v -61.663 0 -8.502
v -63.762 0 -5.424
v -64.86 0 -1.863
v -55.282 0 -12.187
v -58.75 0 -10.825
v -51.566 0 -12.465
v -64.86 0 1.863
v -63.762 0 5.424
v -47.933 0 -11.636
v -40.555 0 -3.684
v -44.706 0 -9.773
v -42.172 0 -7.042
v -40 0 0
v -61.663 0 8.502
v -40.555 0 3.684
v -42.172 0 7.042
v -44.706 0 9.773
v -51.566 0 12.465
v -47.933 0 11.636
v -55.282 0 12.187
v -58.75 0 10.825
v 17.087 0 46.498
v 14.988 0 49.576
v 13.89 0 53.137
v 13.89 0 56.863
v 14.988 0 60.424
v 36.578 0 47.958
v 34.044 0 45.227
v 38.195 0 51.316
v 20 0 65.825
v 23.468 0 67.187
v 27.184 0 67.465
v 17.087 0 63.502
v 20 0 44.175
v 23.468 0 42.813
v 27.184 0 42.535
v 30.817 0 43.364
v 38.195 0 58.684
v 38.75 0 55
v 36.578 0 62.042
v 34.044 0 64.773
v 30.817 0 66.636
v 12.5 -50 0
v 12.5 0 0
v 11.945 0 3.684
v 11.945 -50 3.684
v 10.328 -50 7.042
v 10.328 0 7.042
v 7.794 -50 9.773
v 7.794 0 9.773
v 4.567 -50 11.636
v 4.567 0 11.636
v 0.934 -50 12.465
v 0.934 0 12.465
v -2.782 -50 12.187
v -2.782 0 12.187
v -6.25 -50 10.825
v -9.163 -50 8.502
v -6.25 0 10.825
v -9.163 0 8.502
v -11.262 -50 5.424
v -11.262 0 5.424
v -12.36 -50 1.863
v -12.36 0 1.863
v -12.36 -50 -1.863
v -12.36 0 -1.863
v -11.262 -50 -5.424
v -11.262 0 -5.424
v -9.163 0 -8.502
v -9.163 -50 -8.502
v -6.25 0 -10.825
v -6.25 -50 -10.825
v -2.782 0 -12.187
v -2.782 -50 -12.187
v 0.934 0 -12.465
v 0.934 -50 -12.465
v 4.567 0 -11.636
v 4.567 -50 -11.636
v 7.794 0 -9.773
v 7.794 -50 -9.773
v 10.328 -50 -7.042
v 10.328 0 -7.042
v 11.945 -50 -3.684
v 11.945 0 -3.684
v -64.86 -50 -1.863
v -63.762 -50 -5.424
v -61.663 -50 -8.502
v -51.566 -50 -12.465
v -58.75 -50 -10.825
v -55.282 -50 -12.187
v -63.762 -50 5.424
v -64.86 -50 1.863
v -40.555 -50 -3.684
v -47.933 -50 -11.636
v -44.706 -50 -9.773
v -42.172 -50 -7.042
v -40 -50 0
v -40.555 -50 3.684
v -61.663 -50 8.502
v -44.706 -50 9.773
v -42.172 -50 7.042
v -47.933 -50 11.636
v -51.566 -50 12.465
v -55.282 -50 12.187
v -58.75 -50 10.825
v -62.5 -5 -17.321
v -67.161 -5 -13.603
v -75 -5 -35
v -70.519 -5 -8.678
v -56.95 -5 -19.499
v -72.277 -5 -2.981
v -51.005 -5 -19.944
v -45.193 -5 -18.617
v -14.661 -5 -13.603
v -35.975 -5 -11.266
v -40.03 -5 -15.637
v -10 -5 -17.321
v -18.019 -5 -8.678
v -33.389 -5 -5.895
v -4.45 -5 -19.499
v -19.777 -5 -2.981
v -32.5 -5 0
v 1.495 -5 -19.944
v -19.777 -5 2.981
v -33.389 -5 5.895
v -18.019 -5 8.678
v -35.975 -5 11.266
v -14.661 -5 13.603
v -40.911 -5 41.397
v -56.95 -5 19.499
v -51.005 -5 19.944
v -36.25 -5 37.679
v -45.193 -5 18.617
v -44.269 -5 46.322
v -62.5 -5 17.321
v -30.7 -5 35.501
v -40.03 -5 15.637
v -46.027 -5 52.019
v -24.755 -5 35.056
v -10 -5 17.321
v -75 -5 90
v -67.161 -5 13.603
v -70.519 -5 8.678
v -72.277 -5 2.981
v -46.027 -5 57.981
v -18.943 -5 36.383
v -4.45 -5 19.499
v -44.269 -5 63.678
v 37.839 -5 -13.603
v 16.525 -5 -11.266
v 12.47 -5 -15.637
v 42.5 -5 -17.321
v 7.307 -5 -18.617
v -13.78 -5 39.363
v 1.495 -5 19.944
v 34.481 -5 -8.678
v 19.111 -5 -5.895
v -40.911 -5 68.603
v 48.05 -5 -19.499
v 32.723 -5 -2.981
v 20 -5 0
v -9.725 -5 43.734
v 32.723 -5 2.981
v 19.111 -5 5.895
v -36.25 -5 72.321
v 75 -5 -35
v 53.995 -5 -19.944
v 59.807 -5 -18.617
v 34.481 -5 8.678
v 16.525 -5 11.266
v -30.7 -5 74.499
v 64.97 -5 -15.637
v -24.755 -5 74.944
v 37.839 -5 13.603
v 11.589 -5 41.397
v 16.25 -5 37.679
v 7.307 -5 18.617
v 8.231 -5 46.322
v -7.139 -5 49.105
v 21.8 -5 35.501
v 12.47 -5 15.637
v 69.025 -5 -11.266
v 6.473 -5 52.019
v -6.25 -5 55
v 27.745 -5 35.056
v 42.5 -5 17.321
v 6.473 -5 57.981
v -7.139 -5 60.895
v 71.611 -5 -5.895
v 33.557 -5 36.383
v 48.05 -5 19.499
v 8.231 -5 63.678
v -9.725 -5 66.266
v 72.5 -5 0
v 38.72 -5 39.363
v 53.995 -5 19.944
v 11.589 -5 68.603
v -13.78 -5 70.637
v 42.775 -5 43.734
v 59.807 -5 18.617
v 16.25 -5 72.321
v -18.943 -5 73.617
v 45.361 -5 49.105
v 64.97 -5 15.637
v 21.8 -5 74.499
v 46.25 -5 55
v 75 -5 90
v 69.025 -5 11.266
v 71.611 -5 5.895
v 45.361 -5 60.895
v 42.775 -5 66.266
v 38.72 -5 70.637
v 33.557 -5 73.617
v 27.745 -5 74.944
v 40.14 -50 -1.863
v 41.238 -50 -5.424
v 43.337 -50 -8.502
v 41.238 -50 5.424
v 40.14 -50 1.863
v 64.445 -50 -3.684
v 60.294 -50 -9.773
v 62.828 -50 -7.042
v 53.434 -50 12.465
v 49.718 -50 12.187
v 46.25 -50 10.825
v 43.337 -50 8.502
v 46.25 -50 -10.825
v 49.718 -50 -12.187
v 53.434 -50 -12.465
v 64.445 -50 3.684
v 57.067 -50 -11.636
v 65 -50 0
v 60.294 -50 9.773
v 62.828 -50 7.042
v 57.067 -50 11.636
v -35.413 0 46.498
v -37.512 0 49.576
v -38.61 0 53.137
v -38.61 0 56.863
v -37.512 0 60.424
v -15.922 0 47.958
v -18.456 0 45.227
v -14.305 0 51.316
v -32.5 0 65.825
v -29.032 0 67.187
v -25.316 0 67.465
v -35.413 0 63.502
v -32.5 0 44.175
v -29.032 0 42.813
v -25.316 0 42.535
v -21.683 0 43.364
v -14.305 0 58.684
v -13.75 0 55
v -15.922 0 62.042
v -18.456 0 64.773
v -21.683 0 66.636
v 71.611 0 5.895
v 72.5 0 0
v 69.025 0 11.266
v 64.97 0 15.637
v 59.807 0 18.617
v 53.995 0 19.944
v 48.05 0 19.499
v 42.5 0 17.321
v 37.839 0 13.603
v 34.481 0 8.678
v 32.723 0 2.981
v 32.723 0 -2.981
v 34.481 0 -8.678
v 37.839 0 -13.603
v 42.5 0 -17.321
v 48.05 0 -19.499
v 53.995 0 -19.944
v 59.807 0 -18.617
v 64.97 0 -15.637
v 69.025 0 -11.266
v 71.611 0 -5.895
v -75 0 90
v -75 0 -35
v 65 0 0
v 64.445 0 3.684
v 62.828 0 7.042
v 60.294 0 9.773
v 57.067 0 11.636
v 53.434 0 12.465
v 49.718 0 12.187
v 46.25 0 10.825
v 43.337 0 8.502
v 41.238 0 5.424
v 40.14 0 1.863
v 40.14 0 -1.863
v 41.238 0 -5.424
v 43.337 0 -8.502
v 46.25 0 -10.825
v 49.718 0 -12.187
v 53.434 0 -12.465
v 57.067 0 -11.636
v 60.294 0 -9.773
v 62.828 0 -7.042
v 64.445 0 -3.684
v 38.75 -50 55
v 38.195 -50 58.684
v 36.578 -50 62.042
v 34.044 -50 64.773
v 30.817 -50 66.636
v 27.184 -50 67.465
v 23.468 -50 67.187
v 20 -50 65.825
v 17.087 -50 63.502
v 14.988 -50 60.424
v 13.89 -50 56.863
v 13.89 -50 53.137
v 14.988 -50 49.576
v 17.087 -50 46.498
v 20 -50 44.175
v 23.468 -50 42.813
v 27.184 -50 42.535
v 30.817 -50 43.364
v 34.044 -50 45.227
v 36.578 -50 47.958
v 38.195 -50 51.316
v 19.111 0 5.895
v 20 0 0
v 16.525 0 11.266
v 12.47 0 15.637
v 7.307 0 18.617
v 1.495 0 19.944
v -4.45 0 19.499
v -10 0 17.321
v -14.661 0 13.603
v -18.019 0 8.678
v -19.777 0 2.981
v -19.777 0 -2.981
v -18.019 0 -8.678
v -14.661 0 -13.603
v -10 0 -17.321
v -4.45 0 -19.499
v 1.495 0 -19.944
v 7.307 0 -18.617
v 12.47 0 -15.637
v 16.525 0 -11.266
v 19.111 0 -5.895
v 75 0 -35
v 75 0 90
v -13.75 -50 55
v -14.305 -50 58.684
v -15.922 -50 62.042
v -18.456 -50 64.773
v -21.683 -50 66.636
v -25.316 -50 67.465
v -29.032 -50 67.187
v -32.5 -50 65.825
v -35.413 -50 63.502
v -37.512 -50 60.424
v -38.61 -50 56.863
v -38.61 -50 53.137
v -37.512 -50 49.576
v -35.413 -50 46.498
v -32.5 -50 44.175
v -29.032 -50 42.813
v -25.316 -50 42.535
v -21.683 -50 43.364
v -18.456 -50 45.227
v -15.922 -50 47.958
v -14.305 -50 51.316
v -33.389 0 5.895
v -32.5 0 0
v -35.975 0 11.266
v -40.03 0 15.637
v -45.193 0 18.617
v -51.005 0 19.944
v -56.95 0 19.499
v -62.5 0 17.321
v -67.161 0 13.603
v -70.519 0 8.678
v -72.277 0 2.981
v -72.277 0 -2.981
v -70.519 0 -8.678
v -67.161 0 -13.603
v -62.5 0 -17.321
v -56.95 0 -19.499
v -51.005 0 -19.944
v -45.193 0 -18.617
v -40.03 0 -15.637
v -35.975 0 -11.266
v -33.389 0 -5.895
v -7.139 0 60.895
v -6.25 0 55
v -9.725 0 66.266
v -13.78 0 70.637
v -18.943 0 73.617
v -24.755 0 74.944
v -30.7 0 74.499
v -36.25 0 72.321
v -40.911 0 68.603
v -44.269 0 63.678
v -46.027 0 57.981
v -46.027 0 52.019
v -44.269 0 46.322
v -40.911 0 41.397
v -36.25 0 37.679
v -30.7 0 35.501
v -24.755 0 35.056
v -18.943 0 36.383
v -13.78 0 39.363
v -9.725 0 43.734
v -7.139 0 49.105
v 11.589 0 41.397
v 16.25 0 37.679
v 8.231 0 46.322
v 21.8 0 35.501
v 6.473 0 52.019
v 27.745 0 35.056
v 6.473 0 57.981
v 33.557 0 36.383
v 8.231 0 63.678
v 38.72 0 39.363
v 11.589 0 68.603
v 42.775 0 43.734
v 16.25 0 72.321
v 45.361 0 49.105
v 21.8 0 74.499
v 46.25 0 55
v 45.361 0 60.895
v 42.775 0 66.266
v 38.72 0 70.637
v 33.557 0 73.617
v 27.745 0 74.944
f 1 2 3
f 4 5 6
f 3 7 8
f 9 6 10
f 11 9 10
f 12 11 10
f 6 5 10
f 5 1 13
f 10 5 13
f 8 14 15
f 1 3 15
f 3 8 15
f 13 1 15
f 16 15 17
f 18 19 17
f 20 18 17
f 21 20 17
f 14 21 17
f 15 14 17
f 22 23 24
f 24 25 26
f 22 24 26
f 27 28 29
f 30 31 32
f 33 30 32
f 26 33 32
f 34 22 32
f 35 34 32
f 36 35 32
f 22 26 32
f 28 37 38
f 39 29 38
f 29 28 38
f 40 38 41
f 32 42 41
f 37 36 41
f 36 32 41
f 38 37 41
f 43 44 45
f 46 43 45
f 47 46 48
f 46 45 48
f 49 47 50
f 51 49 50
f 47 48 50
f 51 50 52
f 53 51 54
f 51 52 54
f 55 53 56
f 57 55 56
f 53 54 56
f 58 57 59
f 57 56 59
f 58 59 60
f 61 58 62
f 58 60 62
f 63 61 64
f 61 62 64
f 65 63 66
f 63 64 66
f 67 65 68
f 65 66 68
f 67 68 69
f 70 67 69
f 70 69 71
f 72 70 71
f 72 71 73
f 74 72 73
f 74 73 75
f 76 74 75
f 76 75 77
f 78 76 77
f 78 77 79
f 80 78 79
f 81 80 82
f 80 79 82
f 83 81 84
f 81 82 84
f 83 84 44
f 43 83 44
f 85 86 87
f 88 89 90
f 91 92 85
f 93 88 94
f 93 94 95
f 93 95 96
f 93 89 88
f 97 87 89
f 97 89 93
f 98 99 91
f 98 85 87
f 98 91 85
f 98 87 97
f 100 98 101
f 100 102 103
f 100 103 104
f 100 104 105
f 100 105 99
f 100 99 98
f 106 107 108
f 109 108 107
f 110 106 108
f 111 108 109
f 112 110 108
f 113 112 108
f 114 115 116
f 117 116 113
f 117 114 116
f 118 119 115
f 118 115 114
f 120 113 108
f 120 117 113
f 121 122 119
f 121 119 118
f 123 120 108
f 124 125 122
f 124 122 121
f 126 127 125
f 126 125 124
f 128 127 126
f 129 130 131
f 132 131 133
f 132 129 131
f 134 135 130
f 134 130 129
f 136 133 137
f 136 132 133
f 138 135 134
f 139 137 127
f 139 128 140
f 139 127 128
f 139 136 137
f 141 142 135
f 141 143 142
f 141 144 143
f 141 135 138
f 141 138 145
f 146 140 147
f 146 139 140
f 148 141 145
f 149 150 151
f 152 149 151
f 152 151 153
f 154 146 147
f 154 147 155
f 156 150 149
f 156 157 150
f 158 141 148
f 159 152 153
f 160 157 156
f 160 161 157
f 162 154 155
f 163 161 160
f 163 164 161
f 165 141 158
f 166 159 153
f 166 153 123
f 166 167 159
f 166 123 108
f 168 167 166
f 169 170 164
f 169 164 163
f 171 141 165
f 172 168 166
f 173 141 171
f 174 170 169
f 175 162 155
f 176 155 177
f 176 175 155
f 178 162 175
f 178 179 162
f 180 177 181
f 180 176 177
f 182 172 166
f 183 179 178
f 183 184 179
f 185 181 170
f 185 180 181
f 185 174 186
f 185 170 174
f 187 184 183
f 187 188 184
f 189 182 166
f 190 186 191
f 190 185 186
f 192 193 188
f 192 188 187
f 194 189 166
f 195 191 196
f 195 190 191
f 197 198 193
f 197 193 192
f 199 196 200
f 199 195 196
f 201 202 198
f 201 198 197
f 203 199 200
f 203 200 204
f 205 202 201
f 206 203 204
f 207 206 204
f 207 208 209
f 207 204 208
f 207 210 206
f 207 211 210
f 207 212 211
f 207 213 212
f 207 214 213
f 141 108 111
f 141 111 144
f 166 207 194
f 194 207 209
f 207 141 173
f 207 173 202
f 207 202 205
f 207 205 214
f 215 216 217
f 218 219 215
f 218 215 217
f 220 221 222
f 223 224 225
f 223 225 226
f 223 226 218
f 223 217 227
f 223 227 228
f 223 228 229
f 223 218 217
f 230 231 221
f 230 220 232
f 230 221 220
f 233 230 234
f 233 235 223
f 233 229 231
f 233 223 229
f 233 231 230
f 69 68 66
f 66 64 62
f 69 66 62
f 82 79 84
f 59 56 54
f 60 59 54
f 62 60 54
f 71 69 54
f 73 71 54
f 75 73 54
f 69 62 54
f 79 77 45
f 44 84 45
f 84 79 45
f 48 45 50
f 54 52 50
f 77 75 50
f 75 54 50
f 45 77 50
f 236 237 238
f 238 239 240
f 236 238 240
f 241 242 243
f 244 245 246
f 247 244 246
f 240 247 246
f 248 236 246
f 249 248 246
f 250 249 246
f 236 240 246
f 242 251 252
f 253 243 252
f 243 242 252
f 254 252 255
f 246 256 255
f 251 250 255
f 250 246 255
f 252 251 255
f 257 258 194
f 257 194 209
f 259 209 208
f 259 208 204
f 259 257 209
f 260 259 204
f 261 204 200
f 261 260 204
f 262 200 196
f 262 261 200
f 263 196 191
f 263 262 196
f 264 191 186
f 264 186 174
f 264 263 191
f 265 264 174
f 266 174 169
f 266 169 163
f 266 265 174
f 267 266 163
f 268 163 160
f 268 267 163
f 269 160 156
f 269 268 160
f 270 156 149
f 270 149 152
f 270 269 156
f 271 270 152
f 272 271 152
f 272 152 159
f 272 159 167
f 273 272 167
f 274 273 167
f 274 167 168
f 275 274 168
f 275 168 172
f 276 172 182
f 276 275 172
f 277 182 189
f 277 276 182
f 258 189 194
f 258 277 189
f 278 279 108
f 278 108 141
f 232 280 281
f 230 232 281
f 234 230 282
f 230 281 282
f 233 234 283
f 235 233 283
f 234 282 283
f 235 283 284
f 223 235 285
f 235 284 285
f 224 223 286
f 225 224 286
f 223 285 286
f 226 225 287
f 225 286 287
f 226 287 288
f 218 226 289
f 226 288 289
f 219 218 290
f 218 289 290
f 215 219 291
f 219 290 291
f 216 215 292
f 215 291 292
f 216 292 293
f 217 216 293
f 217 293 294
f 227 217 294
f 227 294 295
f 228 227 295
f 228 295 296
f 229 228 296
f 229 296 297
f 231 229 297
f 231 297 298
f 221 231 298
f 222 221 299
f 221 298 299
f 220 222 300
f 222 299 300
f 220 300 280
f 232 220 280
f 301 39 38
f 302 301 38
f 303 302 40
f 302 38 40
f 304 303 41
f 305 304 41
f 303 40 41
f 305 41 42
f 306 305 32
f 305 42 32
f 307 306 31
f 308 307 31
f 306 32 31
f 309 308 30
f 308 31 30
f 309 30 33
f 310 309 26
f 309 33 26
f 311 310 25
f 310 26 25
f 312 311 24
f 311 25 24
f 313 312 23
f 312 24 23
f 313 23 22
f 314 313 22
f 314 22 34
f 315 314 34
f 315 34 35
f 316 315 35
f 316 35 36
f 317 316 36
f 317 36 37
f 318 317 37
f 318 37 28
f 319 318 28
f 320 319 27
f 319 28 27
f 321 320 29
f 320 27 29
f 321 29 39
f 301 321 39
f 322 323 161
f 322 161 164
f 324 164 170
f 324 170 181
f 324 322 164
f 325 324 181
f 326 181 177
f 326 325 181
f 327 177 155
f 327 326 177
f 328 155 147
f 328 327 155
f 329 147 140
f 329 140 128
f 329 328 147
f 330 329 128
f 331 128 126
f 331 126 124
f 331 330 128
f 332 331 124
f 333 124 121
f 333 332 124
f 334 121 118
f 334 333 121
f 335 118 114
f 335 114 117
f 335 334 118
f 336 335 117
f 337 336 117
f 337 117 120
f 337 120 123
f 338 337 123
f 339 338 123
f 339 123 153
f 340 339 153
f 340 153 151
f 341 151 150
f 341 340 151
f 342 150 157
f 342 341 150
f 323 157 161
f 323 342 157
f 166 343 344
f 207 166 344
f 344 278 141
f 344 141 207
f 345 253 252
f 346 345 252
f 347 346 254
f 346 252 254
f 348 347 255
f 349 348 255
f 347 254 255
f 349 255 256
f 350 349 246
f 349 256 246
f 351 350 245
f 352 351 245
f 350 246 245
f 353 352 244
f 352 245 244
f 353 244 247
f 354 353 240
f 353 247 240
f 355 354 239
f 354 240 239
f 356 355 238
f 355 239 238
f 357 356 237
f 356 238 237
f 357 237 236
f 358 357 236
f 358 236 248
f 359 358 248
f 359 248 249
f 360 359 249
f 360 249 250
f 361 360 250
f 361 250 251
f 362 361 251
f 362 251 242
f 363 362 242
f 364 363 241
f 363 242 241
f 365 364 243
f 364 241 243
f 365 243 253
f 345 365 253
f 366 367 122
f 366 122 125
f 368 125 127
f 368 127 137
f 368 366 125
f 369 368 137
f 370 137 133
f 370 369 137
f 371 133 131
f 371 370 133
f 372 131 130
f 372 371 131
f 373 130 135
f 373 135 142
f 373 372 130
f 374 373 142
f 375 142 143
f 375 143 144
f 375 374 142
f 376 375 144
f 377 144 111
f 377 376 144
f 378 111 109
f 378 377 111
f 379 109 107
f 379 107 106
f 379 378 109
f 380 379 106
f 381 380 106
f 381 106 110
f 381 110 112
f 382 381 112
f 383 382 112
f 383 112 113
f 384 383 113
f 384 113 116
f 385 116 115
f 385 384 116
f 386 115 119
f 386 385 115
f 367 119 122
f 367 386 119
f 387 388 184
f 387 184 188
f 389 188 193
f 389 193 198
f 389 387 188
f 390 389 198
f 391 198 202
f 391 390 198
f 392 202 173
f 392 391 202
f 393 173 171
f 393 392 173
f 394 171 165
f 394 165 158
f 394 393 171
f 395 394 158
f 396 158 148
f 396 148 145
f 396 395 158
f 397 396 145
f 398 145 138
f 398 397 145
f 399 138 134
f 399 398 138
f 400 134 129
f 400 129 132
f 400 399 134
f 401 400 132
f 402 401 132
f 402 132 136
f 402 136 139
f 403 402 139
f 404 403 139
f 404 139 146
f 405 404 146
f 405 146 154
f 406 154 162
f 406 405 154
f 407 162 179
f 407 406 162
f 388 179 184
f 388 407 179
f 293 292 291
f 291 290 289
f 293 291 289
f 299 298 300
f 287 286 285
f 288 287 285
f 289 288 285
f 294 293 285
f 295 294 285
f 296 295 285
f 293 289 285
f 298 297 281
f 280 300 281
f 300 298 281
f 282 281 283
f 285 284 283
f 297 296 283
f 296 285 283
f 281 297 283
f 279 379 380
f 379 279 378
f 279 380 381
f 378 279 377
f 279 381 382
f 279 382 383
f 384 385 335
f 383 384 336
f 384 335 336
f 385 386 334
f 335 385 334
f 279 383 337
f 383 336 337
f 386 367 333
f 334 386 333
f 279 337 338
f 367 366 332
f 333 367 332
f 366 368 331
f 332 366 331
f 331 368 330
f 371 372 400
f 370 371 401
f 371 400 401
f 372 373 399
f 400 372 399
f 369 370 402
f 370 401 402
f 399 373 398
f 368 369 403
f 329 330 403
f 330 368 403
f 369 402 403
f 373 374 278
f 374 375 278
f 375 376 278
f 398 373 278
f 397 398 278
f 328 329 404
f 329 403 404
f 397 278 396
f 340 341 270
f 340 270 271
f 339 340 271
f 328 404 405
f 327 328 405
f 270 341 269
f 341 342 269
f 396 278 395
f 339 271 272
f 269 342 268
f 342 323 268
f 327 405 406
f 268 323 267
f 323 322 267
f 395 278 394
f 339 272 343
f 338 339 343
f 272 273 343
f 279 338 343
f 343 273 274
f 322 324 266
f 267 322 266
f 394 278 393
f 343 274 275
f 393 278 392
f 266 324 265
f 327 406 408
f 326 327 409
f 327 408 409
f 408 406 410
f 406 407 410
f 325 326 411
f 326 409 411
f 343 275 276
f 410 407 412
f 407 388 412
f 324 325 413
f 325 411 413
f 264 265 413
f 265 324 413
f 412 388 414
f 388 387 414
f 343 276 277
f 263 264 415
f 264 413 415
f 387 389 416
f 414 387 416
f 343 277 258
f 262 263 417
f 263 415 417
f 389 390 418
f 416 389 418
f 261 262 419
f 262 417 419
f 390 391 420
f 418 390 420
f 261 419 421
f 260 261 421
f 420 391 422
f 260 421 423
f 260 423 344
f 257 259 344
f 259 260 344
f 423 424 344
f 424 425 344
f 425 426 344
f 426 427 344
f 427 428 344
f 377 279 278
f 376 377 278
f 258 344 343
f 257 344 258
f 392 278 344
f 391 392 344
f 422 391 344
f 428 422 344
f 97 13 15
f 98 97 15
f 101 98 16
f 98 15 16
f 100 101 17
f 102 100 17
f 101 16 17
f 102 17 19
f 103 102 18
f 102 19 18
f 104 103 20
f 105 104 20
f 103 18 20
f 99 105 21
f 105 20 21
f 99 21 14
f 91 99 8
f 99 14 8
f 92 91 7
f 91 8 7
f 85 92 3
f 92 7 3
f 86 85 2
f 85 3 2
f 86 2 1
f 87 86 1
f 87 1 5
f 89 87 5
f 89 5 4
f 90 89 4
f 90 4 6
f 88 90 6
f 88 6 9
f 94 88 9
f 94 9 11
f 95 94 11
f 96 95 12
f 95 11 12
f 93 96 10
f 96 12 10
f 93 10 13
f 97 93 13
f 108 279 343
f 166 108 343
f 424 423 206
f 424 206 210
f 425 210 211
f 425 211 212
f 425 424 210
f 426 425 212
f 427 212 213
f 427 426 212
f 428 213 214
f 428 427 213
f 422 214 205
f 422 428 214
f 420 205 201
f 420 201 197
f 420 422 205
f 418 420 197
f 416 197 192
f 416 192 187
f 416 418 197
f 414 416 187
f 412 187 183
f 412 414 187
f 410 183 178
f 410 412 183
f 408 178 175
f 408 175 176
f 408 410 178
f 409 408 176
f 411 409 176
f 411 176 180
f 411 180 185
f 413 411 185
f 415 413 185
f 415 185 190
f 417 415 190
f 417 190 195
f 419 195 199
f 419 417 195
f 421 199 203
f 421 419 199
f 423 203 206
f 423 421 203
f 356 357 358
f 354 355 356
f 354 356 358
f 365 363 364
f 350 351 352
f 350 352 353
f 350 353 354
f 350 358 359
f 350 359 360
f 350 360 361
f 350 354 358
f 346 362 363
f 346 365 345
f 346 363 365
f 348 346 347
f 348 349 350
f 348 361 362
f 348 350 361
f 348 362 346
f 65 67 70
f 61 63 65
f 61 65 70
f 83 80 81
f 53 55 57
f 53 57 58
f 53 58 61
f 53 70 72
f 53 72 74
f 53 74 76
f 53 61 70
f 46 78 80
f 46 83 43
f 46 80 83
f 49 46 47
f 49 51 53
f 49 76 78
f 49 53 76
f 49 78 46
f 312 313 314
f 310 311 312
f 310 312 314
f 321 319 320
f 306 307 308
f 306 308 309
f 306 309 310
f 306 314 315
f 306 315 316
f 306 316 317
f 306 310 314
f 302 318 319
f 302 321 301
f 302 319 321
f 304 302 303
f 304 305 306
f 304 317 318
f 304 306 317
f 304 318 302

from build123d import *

# Parameters (mm, degrees)
F0_R     = 12.5
F1_DEPTH = 50
F0_W     = 150
F0_H     = 125
F0_R_2   = 20
F2_DEPTH = 5


with BuildPart() as f1:
    # F0 (on Front) → F1 (new body)
    with BuildSketch(Plane.XZ):
        with Locations((-26.25, 55)):
            Circle(F0_R)
        with Locations((26.25, 55)):
            Circle(F0_R)
        with Locations((-52.5, 0)):
            Circle(F0_R)
        Circle(F0_R)
        with Locations((52.5, 0)):
            Circle(F0_R)
    extrude(amount=F1_DEPTH)


with BuildPart() as f2:
    # F0 (on Front) → F2 (new body)
    with BuildSketch(Plane.XZ):
        with Locations((0, 27.5)):
            Rectangle(F0_W, F0_H)
        with Locations((-52.5, 0)):
            Circle(F0_R_2, mode=Mode.SUBTRACT)
        Circle(F0_R_2, mode=Mode.SUBTRACT)
        with Locations((52.5, 0)):
            Circle(F0_R_2, mode=Mode.SUBTRACT)
        with Locations((-26.25, 55)):
            Circle(F0_R_2, mode=Mode.SUBTRACT)
        with Locations((26.25, 55)):
            Circle(F0_R_2, mode=Mode.SUBTRACT)
    extrude(amount=F2_DEPTH)


solid = Compound([f1.part, f2.part])
